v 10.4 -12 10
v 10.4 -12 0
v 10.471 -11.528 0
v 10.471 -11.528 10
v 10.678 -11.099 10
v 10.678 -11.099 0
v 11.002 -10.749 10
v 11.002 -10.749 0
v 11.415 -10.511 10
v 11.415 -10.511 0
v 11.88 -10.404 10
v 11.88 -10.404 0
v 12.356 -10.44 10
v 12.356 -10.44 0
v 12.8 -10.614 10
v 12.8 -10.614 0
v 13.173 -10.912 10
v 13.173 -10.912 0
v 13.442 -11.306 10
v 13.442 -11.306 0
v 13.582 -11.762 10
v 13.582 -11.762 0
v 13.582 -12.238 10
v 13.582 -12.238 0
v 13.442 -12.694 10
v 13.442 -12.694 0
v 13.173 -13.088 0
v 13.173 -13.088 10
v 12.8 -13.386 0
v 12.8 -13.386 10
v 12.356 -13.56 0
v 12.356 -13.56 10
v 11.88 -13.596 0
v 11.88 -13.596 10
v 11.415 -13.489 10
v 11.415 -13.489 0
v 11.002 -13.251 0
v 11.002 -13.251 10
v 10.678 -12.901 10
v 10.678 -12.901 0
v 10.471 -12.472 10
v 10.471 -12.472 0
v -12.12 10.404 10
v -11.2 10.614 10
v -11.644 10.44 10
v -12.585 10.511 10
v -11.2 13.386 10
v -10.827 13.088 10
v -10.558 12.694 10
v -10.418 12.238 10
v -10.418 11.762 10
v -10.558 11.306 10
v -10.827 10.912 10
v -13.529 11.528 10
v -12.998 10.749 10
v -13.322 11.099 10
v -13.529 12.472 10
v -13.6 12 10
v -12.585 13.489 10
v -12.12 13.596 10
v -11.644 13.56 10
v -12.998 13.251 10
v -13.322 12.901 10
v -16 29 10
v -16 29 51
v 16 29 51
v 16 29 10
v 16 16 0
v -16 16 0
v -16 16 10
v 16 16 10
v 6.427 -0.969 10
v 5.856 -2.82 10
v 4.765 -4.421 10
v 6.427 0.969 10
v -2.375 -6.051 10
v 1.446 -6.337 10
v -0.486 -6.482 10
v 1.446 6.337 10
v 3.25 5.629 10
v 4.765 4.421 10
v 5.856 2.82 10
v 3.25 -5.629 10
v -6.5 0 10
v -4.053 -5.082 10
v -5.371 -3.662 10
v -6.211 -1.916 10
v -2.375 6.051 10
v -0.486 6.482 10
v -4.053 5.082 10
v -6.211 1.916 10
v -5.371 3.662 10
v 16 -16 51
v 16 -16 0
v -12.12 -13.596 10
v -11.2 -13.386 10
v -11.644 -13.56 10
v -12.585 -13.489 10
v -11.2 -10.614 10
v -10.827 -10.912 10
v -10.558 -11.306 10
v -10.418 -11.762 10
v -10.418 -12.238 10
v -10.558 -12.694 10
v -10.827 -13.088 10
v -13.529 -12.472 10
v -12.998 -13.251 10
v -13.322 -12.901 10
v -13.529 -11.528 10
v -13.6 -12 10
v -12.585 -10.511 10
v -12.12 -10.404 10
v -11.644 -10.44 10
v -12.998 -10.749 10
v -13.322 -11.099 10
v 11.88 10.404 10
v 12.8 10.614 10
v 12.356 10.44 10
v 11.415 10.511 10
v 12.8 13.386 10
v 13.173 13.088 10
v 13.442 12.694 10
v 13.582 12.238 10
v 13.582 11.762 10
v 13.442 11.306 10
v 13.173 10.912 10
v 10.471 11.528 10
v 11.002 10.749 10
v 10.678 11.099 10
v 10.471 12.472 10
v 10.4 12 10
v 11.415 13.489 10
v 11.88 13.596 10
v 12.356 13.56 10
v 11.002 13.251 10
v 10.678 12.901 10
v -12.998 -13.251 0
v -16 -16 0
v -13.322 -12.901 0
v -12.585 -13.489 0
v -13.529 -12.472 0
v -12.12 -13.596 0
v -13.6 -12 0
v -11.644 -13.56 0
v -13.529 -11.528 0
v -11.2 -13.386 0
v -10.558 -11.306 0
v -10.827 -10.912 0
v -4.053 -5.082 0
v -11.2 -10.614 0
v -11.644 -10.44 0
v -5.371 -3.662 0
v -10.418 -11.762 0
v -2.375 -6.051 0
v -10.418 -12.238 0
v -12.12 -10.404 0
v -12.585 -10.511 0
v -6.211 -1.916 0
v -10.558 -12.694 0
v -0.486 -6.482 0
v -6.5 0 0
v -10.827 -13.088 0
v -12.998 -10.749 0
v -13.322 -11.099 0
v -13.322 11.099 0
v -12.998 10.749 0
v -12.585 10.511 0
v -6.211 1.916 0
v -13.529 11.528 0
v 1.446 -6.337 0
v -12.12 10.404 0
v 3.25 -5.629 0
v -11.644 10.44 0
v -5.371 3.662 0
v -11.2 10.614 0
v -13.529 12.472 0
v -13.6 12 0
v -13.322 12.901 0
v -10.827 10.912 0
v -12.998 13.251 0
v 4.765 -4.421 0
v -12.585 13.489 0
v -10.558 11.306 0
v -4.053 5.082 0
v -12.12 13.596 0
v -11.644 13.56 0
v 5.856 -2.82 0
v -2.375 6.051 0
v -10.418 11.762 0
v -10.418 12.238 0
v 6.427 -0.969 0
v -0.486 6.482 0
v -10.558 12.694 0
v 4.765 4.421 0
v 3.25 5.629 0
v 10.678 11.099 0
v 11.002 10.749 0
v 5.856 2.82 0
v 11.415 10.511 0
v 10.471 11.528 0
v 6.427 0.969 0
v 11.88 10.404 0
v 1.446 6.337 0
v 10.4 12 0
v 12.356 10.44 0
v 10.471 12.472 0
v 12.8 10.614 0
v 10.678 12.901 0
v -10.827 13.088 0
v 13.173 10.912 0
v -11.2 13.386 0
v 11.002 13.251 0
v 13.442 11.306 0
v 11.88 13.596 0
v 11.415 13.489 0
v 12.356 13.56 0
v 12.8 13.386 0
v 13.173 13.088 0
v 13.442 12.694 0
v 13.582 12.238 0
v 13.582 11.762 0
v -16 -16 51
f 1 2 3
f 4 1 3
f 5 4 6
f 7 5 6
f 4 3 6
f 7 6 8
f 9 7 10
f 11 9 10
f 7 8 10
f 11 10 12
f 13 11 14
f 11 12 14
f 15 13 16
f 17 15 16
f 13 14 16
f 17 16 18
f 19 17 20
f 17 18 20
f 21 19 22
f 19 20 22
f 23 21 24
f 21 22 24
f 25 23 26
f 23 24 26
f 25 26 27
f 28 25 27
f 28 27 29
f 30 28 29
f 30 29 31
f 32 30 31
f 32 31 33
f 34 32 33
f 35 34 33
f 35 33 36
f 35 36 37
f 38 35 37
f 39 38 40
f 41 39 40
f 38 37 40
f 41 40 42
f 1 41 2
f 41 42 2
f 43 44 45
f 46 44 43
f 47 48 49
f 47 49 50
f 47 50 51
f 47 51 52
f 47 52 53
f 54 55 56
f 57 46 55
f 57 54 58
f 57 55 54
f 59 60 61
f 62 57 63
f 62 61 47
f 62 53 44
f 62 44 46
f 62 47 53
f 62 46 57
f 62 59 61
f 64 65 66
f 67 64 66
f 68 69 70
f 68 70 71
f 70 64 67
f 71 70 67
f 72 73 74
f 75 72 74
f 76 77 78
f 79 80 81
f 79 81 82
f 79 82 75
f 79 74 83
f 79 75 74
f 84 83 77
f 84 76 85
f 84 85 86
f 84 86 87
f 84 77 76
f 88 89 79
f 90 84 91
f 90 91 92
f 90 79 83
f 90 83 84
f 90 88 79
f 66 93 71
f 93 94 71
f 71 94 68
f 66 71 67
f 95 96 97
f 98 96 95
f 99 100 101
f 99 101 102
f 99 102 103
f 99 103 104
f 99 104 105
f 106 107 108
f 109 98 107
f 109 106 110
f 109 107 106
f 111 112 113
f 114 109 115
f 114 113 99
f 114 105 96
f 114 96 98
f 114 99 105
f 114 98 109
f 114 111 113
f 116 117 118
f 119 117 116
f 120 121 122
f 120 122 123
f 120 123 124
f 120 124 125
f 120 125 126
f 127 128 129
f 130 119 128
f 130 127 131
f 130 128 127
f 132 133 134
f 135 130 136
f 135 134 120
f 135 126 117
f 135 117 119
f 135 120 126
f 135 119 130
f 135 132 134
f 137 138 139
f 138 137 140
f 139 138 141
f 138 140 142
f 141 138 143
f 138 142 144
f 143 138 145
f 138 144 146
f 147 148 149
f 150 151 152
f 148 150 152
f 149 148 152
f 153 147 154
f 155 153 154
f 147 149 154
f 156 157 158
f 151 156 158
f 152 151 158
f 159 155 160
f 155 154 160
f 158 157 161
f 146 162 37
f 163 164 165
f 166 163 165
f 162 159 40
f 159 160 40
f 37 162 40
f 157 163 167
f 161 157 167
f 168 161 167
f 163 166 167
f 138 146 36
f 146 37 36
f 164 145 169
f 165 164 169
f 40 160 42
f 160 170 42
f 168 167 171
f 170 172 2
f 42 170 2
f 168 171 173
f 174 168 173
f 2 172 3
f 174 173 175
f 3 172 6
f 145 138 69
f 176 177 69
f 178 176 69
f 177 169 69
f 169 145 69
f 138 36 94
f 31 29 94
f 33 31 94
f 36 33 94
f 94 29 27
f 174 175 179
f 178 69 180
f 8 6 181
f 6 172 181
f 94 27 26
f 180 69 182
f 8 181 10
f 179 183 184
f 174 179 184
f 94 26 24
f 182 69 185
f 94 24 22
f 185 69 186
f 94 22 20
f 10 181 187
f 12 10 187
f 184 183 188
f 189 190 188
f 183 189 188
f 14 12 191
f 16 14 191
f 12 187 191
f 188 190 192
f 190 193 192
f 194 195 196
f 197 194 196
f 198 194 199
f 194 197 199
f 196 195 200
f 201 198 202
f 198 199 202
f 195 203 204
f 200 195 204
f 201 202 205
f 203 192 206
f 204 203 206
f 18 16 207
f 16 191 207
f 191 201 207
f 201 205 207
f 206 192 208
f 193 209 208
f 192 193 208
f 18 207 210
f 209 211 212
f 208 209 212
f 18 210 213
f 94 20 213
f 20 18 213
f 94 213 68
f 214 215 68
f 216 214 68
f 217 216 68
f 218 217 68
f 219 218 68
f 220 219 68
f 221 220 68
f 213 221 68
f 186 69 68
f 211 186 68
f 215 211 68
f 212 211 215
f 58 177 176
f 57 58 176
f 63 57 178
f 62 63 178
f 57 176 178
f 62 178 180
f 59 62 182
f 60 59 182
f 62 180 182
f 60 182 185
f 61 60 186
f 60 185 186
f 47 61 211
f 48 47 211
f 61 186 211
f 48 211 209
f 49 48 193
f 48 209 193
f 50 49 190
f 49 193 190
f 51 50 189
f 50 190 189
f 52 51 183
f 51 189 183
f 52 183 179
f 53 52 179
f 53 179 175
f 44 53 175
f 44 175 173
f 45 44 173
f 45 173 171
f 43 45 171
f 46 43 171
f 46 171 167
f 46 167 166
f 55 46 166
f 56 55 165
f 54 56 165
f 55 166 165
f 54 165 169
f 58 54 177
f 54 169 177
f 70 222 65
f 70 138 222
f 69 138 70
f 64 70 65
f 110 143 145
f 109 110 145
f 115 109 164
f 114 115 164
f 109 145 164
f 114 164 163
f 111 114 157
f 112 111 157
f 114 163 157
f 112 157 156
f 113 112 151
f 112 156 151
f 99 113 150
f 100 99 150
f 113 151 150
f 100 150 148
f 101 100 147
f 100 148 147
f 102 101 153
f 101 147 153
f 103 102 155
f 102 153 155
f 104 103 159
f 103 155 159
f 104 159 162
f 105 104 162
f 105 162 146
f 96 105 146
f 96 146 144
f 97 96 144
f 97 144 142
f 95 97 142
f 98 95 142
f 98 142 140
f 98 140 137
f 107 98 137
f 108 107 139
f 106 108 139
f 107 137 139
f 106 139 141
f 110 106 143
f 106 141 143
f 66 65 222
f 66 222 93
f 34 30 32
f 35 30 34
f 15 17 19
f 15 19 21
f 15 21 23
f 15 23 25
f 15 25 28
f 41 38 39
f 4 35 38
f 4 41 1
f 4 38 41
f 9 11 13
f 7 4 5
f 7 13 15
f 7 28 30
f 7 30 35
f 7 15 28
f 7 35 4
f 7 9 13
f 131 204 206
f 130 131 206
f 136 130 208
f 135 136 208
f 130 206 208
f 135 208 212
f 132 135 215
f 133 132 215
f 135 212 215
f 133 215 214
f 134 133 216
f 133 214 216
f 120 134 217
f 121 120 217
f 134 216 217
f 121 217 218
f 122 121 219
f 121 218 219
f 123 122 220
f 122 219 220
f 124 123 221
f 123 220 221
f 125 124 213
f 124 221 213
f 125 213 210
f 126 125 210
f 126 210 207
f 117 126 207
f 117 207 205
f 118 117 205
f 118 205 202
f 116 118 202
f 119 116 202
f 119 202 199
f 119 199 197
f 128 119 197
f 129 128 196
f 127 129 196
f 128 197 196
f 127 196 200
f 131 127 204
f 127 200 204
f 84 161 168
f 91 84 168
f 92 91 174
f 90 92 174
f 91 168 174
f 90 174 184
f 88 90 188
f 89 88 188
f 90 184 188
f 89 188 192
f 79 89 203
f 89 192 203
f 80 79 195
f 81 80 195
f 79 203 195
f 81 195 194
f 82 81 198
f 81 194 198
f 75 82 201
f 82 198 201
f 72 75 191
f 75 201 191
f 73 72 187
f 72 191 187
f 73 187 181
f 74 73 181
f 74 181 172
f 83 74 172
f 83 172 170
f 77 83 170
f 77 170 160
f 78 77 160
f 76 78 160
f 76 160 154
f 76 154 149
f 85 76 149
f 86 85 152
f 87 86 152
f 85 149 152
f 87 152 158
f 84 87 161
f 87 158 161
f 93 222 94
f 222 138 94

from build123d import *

# Parameters (mm, degrees)
SKETCH1_W           = 32
SKETCH1_H           = 32
BOSS_EXTRUDE1_DEPTH = 10
SKETCH2_W           = 32
SKETCH2_H           = 45
BOSS_EXTRUDE2_DEPTH = 41
SKETCH3_R           = 1.6
SKETCH3_R_2         = 6.5
CUT_EXTRUDE1_DEPTH  = 10


with BuildPart() as part:
    # Sketch1 → Boss-Extrude1 (new body)
    with BuildSketch(Plane.XY):
        Rectangle(SKETCH1_W, SKETCH1_H)
    extrude(amount=BOSS_EXTRUDE1_DEPTH)

    # Sketch2 → Boss-Extrude2 (add)
    with BuildSketch(Plane.XY.offset(10)):
        with Locations((0, 6.5)):
            Rectangle(SKETCH2_W, SKETCH2_H)
    extrude(amount=BOSS_EXTRUDE2_DEPTH)

    # Sketch3 → Cut-Extrude1 (cut)
    with BuildSketch(Plane(origin=(0, 0, 0), x_dir=(-1, 0, 0), z_dir=(0, 0, -1))):
        with Locations((-12, 12)):
            Circle(SKETCH3_R)
        with Locations((-12, -12)):
            Circle(SKETCH3_R)
        with Locations((12, 12)):
            Circle(SKETCH3_R)
        with Locations((12, -12)):
            Circle(SKETCH3_R)
        Circle(SKETCH3_R_2)
    extrude(amount=-CUT_EXTRUDE1_DEPTH, mode=Mode.SUBTRACT)


solid = part.part
